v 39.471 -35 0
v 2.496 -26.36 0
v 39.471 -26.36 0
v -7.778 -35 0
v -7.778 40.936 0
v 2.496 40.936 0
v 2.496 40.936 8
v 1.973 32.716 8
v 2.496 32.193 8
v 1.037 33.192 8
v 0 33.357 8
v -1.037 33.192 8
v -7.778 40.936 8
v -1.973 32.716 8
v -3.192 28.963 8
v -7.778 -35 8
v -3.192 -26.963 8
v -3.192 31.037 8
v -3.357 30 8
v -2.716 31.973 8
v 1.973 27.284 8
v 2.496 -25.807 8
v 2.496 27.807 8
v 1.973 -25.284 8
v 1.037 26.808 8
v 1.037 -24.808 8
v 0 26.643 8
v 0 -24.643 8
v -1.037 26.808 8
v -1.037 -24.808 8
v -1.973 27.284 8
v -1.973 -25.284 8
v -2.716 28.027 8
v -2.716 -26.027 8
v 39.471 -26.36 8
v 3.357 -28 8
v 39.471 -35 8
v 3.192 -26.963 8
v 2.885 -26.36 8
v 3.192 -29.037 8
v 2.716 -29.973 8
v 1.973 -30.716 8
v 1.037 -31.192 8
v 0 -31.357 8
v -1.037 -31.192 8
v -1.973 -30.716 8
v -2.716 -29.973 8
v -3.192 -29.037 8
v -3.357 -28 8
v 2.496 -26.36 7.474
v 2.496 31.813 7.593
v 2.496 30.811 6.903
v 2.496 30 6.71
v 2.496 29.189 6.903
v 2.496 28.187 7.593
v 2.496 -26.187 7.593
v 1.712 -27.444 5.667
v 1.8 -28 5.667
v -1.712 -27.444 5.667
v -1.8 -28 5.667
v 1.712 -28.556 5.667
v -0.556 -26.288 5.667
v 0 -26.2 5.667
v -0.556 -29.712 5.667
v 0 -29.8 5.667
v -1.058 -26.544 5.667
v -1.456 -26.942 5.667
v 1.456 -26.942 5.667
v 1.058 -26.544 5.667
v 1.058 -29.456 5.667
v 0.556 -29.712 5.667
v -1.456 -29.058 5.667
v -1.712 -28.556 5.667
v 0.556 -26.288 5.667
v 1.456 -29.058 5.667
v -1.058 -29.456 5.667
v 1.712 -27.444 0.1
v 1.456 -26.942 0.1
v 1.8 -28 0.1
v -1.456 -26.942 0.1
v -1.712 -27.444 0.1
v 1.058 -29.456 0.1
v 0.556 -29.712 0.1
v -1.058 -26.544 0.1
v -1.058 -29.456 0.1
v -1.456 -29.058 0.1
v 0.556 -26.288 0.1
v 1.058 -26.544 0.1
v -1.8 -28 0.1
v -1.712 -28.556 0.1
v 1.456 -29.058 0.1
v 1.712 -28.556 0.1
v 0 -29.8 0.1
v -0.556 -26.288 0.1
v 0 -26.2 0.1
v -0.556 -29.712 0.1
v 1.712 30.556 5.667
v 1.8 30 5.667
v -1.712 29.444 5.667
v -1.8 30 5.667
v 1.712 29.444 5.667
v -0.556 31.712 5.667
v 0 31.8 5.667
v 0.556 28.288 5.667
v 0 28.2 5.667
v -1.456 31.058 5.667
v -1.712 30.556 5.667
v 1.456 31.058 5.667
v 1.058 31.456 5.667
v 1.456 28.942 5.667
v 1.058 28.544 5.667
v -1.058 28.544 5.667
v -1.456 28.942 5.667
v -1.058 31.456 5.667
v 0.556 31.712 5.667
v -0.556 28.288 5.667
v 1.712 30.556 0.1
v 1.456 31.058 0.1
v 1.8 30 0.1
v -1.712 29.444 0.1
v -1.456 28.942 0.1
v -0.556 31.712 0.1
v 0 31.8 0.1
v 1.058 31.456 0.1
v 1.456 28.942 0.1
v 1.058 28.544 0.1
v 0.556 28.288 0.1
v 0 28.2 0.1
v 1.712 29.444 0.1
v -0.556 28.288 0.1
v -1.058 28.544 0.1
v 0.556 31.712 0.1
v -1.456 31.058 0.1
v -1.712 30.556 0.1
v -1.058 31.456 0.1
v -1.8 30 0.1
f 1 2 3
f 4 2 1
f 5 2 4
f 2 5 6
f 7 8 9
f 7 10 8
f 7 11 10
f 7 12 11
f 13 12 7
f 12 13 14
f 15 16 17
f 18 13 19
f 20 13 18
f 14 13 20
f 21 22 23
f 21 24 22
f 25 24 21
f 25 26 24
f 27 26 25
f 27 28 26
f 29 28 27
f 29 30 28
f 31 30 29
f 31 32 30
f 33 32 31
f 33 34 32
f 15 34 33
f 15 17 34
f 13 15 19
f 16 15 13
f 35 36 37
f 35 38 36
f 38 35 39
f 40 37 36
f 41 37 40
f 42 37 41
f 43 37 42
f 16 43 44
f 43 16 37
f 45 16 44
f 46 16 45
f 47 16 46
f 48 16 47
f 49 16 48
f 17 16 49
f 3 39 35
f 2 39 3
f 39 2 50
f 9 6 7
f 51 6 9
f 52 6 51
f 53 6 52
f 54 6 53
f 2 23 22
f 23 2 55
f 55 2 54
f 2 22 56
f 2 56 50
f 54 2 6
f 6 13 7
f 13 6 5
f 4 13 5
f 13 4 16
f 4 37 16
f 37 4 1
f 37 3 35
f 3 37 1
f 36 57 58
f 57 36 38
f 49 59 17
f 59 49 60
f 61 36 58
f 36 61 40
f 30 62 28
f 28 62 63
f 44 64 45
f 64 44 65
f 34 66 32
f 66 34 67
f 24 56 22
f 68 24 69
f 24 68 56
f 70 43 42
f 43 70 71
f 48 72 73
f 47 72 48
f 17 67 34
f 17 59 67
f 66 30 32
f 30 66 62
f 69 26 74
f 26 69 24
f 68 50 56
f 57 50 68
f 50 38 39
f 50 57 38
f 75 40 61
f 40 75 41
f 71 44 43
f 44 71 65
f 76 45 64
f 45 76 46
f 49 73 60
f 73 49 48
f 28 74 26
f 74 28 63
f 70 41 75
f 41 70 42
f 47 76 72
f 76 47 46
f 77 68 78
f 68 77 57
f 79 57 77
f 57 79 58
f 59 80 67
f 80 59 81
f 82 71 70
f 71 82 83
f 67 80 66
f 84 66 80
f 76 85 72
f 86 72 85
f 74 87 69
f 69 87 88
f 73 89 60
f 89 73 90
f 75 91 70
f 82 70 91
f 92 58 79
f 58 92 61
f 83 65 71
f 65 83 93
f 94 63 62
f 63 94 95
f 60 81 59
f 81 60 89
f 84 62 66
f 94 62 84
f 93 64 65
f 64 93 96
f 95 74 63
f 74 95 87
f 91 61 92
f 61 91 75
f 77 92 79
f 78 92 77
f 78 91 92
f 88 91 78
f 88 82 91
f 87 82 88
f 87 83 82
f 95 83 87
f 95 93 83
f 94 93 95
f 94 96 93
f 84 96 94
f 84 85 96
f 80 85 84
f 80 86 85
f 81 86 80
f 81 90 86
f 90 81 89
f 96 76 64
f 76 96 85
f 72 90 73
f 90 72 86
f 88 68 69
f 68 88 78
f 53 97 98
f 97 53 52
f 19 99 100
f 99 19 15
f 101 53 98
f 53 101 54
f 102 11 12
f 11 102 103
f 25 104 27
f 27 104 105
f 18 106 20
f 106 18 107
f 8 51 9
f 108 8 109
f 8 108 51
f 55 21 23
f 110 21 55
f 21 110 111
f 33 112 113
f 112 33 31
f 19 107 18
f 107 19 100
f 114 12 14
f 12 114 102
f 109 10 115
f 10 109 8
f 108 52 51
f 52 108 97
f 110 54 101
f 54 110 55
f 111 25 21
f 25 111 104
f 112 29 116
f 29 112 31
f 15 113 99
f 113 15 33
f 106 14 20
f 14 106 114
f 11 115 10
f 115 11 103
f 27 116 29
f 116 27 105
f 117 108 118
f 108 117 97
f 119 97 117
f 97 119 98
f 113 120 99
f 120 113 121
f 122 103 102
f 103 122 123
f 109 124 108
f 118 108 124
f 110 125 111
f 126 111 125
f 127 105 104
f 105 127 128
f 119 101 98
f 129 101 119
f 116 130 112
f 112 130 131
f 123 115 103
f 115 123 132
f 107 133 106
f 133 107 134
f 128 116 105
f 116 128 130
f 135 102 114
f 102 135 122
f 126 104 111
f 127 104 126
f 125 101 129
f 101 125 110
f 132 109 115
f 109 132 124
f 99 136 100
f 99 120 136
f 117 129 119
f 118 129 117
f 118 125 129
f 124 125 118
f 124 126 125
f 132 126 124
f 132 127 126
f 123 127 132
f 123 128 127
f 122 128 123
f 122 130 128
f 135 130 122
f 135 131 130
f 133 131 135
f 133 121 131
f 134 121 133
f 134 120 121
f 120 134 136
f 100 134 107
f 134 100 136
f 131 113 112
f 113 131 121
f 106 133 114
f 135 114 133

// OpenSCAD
// Street Numbers for 3D printing
// Charles Tilford, 2019
// License: CC BY-NC-SA 4.0
//   https://creativecommons.org/licenses/by-nc-sa/4.0/

char="L";     // The number/letter to print

// Units are in mm, except for height of letter

// How many inches high should letter be?
inchesHigh=3;
// How thick/deep should letter be (mm)?
depth=8;

// Character coordinates just center the letter
charX=-18;    // Character X coord
charY=-35;    // Character Y coord
topScrew=30;  // Top screw Y coord
botScrew=-28; // Bottom screw Y coord
height=8;     // Thickness of character
// Screw dimensions. Default presumes
// #6 sheet metal screw
screwWid=3.6; // Width of screw shaft
screwTop=6.78;// Width of screw head
screwCon=5.08;// Height of head 'cone'

// Font to print in. Your system needs this
// installed, of course. If changed the hole
// positions almost certainly need to be
// changed, and maybe charX/charY.
fName="Open Sans Extrabold";
// https://fonts.google.com/specimen/Open+Sans
// Designer: Steve Matteson

// Thin floor below holes. My printer was
// struggling to have the hole 'border' stick
// to the stage. Just drill/screw thru it.
holeFloor=0.1; 

// ==========================================
// ===== All values below are auto-calculated
// ==========================================

// Scaled values
scaleFactor=inchesHigh / 3;
cX=charX * scaleFactor;
cY=charY * scaleFactor;
tS=topScrew * scaleFactor;
bS=botScrew * scaleFactor;
// Where do we start drawing screw head cone?
oS=depth - (screwCon-.05);

difference() {
  // We use difference() to punch out the screw holes
  // in the character
    
  // The character itself, 8mm thick
  translate([cX,cY,0])
    linear_extrude(height=depth, scale=1)
    text(char, size=(75*scaleFactor),
         $fn=100, font=fName);
    
  // Bottom screw hole
  translate([0,bS,oS]) color("red")
    cylinder(h=screwCon, d2=screwTop,
             d1=0, $fn=20);
   translate([0,bS,holeFloor])
    cylinder(h=20, d=screwWid, $fn=20);
    
  // Top screw hole
  translate([0,tS,oS]) color("red")
    cylinder(h=screwCon, d2=screwTop,
             d1=0, $fn=20);
  translate([0,tS,holeFloor])
    cylinder(h=20, d=screwWid, $fn=20);
}

// Colors are just to aid visualization of
// void spaces. $fn is "featuer number", ie how
// many polygons are devoted to object. The values
// above should be near your printing limit anyway.

// Developed in OpenSCAD
//    https://www.openscad.org/
